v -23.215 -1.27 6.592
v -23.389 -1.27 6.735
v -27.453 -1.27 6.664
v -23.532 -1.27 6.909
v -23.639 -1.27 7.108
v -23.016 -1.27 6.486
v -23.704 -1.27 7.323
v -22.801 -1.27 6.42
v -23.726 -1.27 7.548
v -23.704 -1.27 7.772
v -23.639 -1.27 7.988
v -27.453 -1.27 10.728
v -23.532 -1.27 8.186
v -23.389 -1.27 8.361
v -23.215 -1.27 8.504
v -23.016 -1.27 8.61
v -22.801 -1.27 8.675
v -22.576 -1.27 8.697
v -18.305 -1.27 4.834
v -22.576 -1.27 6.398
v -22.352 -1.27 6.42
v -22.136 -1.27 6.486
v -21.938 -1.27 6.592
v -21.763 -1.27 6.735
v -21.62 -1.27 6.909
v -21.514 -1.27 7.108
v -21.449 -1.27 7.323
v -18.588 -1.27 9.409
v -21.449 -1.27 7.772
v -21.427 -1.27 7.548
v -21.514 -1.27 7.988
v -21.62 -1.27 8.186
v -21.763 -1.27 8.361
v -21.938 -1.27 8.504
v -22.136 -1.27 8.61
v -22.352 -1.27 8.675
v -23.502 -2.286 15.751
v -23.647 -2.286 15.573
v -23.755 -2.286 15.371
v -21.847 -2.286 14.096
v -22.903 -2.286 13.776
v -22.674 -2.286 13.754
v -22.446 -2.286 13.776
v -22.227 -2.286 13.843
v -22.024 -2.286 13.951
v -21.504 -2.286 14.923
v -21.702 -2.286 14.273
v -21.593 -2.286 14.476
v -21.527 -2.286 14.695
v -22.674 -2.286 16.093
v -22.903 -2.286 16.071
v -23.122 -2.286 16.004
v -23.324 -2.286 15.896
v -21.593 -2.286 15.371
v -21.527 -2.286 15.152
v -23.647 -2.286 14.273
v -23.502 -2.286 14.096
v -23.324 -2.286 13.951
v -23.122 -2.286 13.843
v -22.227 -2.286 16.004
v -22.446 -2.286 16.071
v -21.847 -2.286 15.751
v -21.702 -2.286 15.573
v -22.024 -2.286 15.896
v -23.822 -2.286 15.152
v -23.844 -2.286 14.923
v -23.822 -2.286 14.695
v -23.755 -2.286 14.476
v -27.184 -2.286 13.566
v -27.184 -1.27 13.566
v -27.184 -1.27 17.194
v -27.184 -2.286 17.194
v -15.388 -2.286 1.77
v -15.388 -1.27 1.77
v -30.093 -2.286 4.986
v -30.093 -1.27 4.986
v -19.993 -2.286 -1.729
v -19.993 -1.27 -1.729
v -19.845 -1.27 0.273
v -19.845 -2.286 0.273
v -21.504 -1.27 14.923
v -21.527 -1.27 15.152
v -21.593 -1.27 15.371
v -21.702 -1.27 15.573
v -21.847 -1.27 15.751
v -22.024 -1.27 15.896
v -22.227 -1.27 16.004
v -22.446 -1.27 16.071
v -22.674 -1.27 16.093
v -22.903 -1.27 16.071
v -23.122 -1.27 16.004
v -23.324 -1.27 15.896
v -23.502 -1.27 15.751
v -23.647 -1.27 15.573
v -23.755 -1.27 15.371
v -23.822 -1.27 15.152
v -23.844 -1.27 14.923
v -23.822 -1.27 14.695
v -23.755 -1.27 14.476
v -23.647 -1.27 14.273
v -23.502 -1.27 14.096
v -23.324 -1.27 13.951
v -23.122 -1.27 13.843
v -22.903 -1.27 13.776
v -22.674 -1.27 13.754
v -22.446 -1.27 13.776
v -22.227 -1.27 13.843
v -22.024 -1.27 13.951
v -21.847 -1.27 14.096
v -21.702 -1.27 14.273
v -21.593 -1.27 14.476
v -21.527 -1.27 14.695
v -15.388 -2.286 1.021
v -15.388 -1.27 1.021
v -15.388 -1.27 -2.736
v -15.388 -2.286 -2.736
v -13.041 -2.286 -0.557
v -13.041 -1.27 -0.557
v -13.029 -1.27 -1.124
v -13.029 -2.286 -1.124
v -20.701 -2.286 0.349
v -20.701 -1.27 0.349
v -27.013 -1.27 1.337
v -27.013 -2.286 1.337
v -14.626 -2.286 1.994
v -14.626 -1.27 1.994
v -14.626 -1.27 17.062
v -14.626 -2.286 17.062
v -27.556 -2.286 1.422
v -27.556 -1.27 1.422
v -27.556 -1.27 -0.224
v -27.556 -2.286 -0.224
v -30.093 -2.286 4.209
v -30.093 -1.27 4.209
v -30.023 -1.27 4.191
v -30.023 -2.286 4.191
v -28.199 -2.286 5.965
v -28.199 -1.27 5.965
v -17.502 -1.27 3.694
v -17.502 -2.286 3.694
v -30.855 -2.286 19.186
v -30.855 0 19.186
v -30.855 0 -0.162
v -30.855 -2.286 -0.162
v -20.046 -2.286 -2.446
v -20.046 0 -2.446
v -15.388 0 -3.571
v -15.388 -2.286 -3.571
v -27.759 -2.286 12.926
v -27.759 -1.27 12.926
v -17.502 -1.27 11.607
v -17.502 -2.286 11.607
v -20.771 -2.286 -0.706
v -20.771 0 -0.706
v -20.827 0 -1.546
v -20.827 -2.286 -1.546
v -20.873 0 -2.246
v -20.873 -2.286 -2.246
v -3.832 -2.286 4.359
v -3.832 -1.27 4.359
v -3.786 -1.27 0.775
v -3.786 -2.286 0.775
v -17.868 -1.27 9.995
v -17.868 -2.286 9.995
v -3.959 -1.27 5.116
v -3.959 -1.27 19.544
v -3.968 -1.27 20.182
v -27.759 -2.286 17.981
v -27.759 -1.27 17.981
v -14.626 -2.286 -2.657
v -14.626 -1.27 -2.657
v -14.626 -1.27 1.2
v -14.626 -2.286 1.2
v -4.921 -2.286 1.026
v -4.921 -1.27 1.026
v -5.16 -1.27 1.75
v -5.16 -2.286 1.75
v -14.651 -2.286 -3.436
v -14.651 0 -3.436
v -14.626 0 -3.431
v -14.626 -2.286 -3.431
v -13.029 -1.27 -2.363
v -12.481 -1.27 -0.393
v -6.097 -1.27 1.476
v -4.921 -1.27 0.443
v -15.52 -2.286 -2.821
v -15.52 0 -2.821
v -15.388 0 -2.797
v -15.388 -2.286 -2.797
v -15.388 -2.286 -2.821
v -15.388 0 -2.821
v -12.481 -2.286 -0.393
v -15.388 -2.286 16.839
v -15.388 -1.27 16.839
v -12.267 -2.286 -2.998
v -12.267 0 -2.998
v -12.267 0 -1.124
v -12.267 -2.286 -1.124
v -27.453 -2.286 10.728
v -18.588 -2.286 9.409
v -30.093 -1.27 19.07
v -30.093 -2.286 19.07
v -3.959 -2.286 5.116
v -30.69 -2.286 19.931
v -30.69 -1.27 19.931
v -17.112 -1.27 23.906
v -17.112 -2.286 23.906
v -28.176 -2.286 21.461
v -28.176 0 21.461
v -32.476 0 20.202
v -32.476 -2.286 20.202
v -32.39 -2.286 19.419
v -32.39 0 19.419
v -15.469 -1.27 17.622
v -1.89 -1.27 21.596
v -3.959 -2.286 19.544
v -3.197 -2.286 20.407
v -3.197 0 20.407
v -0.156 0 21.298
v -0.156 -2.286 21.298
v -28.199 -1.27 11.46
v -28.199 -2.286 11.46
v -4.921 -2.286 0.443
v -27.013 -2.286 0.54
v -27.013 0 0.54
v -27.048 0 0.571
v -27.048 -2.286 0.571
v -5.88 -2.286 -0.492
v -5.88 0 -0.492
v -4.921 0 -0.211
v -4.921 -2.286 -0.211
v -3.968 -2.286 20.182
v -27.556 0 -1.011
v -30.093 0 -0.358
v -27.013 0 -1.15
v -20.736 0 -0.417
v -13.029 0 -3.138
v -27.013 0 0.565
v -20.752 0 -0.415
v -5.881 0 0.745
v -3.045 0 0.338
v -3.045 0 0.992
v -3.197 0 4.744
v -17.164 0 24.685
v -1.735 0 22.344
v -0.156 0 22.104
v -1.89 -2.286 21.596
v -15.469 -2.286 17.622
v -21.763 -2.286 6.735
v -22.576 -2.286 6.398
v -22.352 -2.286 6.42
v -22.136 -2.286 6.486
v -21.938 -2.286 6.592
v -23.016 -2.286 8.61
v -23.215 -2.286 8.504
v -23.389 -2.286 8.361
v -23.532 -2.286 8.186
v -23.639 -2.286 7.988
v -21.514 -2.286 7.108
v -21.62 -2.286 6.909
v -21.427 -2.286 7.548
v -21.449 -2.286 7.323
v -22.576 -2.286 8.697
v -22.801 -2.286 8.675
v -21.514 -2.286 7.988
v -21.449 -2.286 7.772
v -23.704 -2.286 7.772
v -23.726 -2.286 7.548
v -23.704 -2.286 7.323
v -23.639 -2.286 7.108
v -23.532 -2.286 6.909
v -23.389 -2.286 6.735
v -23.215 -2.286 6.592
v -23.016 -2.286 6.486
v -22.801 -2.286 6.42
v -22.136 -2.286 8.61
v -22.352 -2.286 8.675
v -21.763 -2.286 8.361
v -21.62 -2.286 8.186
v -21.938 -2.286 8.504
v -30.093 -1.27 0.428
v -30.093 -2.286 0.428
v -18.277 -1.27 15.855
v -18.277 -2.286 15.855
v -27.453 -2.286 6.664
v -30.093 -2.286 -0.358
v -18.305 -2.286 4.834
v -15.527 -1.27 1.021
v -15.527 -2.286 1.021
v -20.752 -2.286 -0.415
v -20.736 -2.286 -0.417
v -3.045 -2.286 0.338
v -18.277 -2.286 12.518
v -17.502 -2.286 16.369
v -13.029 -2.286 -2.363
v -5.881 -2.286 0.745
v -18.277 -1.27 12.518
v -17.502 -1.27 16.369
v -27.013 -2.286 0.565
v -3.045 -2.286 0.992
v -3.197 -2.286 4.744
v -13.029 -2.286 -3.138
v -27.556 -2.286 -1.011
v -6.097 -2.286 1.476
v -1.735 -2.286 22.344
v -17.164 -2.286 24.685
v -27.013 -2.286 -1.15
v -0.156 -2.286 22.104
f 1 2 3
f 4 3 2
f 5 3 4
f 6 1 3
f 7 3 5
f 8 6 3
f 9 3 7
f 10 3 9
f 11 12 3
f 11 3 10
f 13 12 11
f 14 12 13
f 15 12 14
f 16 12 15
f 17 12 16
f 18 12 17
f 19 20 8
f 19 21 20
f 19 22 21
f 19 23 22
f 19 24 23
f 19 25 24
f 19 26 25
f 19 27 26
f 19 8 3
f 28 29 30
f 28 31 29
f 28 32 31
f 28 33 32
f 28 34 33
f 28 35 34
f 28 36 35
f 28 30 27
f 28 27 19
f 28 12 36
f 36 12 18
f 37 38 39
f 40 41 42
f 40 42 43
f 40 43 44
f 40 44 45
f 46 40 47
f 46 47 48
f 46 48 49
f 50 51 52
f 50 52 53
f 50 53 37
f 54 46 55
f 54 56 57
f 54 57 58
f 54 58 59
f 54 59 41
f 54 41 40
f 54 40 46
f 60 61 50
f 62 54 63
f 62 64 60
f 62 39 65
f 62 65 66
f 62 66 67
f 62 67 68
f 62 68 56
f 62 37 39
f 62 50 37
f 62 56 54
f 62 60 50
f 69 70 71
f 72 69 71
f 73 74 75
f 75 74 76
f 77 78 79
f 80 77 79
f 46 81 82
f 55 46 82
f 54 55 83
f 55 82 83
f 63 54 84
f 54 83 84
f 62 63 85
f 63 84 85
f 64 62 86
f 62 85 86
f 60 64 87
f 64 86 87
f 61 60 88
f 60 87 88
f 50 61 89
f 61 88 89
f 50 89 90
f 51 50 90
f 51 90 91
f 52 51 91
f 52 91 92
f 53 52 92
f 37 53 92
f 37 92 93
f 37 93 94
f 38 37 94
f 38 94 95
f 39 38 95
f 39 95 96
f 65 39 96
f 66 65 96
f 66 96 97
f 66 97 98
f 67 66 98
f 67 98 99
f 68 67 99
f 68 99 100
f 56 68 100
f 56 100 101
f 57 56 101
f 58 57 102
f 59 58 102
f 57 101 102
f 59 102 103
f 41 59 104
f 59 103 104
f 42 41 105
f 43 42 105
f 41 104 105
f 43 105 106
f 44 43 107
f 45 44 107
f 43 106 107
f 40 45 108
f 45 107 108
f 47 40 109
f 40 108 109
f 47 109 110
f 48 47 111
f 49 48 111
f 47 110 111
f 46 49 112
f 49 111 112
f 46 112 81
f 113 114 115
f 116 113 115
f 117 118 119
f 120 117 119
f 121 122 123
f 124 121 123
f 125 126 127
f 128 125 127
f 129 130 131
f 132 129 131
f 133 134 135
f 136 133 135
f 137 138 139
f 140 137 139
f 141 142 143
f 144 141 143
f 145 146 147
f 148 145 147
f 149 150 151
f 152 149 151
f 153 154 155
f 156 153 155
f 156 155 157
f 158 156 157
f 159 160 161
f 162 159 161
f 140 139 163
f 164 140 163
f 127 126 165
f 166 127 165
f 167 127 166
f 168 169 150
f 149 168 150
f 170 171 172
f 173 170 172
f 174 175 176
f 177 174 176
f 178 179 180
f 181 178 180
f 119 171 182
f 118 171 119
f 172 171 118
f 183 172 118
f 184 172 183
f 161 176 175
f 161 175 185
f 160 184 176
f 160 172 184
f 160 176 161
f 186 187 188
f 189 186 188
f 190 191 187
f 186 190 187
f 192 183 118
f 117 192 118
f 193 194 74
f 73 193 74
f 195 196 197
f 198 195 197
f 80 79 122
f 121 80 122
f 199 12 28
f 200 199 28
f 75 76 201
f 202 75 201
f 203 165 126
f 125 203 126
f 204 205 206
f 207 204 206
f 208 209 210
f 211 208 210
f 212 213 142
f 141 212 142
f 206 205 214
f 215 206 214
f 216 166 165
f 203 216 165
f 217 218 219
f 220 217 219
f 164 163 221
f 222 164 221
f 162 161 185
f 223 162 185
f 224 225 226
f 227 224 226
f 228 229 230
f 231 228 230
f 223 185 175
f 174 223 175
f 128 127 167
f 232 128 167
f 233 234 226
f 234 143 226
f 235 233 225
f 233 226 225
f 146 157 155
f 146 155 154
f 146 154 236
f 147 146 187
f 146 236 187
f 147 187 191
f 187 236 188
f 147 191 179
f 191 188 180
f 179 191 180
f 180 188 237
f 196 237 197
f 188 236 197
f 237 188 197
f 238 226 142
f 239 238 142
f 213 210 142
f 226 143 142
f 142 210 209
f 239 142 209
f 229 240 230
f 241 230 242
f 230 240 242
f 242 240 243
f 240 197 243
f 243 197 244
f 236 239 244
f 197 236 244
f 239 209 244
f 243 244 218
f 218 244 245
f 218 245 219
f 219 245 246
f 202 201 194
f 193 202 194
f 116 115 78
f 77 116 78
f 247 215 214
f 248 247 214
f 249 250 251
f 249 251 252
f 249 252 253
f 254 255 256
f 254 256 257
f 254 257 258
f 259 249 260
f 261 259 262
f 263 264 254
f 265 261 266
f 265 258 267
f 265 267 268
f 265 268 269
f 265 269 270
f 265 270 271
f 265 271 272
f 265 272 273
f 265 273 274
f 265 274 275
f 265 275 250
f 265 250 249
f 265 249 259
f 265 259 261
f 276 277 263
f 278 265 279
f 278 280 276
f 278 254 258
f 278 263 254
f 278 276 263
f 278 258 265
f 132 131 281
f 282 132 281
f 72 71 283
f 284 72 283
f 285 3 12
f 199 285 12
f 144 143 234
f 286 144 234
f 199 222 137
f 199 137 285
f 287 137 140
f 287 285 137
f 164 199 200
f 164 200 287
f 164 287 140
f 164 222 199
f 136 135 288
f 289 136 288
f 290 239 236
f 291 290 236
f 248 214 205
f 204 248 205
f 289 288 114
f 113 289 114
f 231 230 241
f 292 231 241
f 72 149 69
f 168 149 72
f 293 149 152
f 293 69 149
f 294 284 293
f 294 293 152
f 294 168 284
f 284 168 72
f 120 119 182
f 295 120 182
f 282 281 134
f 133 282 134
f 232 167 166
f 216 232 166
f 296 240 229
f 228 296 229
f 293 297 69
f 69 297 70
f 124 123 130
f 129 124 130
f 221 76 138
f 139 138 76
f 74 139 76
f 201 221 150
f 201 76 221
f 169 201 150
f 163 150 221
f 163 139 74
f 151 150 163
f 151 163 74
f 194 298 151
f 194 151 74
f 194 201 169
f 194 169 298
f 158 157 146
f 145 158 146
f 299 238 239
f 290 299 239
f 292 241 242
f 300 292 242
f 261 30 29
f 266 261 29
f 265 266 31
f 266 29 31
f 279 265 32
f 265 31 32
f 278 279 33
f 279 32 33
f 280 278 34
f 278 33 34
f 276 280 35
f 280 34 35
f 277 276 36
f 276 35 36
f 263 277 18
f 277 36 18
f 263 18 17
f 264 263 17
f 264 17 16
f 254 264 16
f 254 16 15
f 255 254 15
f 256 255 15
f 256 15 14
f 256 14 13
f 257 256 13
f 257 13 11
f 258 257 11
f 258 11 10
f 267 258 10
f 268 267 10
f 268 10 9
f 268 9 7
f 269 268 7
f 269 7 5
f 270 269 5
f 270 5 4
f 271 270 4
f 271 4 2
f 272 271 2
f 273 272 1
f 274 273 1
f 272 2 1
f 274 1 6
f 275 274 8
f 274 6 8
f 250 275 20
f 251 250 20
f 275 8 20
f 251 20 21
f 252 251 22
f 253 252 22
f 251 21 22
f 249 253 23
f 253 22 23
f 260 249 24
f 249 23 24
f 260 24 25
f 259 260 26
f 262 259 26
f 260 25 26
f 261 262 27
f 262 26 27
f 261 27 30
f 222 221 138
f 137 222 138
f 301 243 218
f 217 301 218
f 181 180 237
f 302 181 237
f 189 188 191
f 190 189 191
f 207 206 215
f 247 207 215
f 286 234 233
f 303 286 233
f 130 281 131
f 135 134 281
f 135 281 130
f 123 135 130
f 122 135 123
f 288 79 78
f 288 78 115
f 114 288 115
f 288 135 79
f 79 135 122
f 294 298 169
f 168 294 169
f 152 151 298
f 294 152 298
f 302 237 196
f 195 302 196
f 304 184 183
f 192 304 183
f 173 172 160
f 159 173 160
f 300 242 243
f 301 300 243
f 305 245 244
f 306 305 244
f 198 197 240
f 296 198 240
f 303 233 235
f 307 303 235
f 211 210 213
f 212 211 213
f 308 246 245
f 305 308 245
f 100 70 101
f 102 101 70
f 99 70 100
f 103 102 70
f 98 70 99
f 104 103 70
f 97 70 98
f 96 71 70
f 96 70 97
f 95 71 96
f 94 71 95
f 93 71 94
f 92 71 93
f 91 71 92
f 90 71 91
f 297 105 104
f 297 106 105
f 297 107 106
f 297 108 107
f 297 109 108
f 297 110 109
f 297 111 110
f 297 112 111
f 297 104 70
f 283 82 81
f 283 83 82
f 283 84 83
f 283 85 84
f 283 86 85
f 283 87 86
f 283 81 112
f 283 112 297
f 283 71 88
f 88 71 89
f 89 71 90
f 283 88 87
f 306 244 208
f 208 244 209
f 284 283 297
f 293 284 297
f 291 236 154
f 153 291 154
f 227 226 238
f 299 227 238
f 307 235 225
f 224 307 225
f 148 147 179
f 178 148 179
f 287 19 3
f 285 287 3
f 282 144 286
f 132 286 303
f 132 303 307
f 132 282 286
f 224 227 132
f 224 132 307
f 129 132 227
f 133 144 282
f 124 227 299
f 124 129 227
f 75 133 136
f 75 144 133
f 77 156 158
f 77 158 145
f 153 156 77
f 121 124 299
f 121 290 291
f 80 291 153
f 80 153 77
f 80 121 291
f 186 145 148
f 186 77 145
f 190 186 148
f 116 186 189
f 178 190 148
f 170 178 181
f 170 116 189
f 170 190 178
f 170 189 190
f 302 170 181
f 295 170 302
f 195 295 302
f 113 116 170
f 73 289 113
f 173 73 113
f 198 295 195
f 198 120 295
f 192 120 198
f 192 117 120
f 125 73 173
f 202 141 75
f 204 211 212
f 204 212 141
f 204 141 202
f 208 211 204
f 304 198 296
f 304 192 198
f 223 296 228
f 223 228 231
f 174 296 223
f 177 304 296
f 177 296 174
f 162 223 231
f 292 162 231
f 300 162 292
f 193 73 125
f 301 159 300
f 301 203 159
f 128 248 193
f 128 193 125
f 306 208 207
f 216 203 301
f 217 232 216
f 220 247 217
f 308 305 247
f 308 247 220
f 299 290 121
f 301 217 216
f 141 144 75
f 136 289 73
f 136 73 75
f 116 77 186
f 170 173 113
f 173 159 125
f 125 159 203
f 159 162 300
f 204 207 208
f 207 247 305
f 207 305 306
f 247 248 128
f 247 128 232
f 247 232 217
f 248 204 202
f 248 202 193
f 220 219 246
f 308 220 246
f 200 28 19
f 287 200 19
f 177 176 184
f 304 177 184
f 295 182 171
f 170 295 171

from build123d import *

# Parameters (mm, degrees)
F1_DEPTH = 1.27
F0_R     = 1.1698918357
F0_R_2   = 1.149683984
F2_DEPTH = 2.286


with BuildPart() as f1:
    # F0 (on Front) → F1 (new body)
    with BuildSketch(Plane.XZ):
        Polygon((-15.388094912, 1.7704545665), (-15.388094912, 16.057066756), (-15.388094912, 16.8387157017), (-30.0930766836, 19.0700641461), (-30.0930766836, 18.4871374451), (-30.0930766836, 4.9859051822), align=None)
        Polygon((-28.1987807881, 11.4603284719), (-17.8684613835, 9.9950339617), (-17.5021312367, 3.694271666), (-28.1987807881, 5.9654787155), align=None, mode=Mode.SUBTRACT)
        Polygon((-27.7591816317, 12.9256220507), (-27.7591816317, 17.9808847578), (-17.5021312367, 16.3690615418), (-17.5021312367, 11.6068571778), align=None, mode=Mode.SUBTRACT)
    extrude(amount=F1_DEPTH)



with BuildPart() as f1b:
    # F0 (on Front) → F1, piece 2 (new body)
    with BuildSketch(Plane.XZ):
        Polygon((-18.2767084967, 15.855339353), (-27.1837434899, 17.1943055438), (-27.1837434899, 13.5655133026), (-18.2767084967, 12.5176263945), align=None)
        with Locations((-22.6742944847, 14.9233993115)):
            Circle(F0_R, mode=Mode.SUBTRACT)
    extrude(amount=F1_DEPTH)


with BuildPart() as f1c:
    # F0 (on Front) → F1, piece 3 (new body)
    with BuildSketch(Plane.XZ):
        Polygon((-30.6900013238, 19.9313648045), (-15.4686479767, 17.6216616277), (-1.8903917537, 21.5964431966), (-17.1117451009, 23.9061463734), align=None)
    extrude(amount=F1_DEPTH)


with BuildPart() as f1d:
    # F0 (on Front) → F1, piece 4 (new body)
    with BuildSketch(Plane.XZ):
        Polygon((-14.626094912, 16.057066756), (-14.626094912, 1.9935158717), (-3.9594611633, 5.1159742), (-3.9594611633, 19.5436675764), (-3.9680227461, 20.1817290912), (-14.626094912, 17.0617770069), align=None)
    extrude(amount=F1_DEPTH)


with BuildPart() as f1e:
    # F0 (on Front) → F1, piece 5 (new body)
    with BuildSketch(Plane.XZ):
        Polygon((-3.8323173759, 4.3592156278), (-14.626094912, 1.1995383243), (-14.626094912, -2.6566980141), (-13.0292281976, -2.3633678097), (-13.0292281976, -1.1240722508), (-13.0411074846, -0.5566334484), (-12.4813056802, -0.3927618984), (-6.0969826496, 1.4761297395), (-5.1597074379, 1.7504995978), (-4.9214556754, 1.0262658156), (-4.9214556754, 0.4425999067), (-3.7855914693, 0.7751029937), align=None)
    extrude(amount=F1_DEPTH)


with BuildPart() as f1f:
    # F0 (on Front) → F1, piece 6 (new body)
    with BuildSketch(Plane.XZ):
        Polygon((-15.388094912, -2.7357117464), (-15.388094912, 1.0209244658), (-15.527460836, 1.0209244658), (-30.0231560015, 4.1906116282), (-30.0930766836, 4.2085912157), (-30.0930766836, 0.4284923682), (-27.5556394443, -0.2239908959), (-27.5556394443, 1.4215863233), (-27.0130208861, 1.3366546978), (-20.7008908468, 0.3486688349), (-19.8447576891, 0.273127106), (-19.9932244299, -1.7287355547), align=None)
    extrude(amount=F1_DEPTH)


with BuildPart() as f1g:
    # F0 (on Front) → F1, piece 7 (new body)
    with BuildSketch(Plane.XZ):
        Polygon((-18.5878000389, 9.4085130813), (-27.4529627692, 10.7276812168), (-27.4529627692, 6.66401535), (-18.3046332728, 4.8343520584), align=None)
        with Locations((-22.5763938557, 7.5477305772)):
            Circle(F0_R_2, mode=Mode.SUBTRACT)
    extrude(amount=F1_DEPTH)


with BuildPart() as f1_1:
    add(f1.part)

    add(f1b.part)  # F2 merges F1b

    add(f1c.part)  # F2 merges F1c

    add(f1d.part)  # F2 merges F1d

    add(f1e.part)  # F2 merges F1e

    add(f1f.part)  # F2 merges F1f

    add(f1g.part)  # F2 merges F1g
    # F0 (on Front) → F2 (join)
    with BuildSketch(Plane.XZ):
        Polygon((-17.5021312367, 3.694271666), (-17.8684613835, 9.9950339617), (-28.1987807881, 11.4603284719), (-28.1987807881, 5.9654787155), align=None)
        Polygon((-27.4529627692, 6.66401535), (-27.4529627692, 10.7276812168), (-18.5878000389, 9.4085130813), (-18.3046332728, 4.8343520584), align=None, mode=Mode.SUBTRACT)
        Polygon((-17.5021312367, 16.3690615418), (-27.7591816317, 17.9808847578), (-27.7591816317, 12.9256220507), (-17.5021312367, 11.6068571778), align=None)
        Polygon((-27.1837434899, 13.5655133026), (-27.1837434899, 17.1943055438), (-18.2767084967, 15.855339353), (-18.2767084967, 12.5176263945), align=None, mode=Mode.SUBTRACT)
        Polygon((-32.4763386121, 20.2024253873), (-30.6900013238, 19.9313648045), (-17.1117451009, 23.9061463734), (-1.8903917537, 21.5964431966), (-0.1563745312, 22.1040444366), (-1.7350990934, 22.3436016595), (-17.1640651666, 24.6848081963), (-28.1764094956, 21.4611495356), align=None)
        Polygon((-3.9594611633, 5.1159742), (-14.626094912, 1.9935158717), (-14.626094912, 1.7704545955), (-14.626094912, 1.1995383243), (-3.8323173759, 4.3592156278), (-3.7855914693, 0.7751029937), (-3.0450882633, 0.9918715129), (-3.1974611633, 4.7442035481), (-3.1974611633, 19.5436675764), (-3.1974611633, 20.4072966403), (-3.9680227461, 20.1817290912), (-3.9594611633, 19.5436675764), align=None)
        Polygon((-30.0930766836, 4.2085912157), (-30.0930766836, 4.9859051822), (-30.0930766836, 18.4871374451), (-30.0930766836, 19.0700641461), (-30.8550766836, 19.185690778), (-30.8550766836, 18.4871374451), (-30.8550766836, 4.9331725397), (-30.8550766836, 0.6244350459), (-30.8505439091, 0.6232694764), (-30.8485884176, 0.6227666362), (-30.0930766836, 0.4284923682), align=None)
        Polygon((-30.0930766836, 19.0700641461), (-15.388094912, 16.8387157017), (-15.4686479767, 17.6216616277), (-30.6900013238, 19.9313648045), (-32.4763386121, 20.2024253873), (-32.3898017041, 19.4185714671), (-30.8550766836, 19.185690778), align=None)
        Polygon((-15.4686479767, 17.6216616277), (-15.388094912, 16.8387157017), (-14.626094912, 17.0617770069), (-3.9680227461, 20.1817290912), (-3.1974611633, 20.4072966403), (-0.1563745312, 21.2975181015), (-0.1563745312, 22.1040444366), (-1.8903917537, 21.5964431966), align=None)
        Polygon((-15.388094912, 16.8387157017), (-15.388094912, 16.057066756), (-15.388094912, 1.7704545665), (-14.626094912, 1.9935158717), (-14.626094912, 16.057066756), (-14.626094912, 17.0617770069), align=None)
        Polygon((-15.388094912, 1.0209244658), (-15.388094912, 1.7704545665), (-30.0930766836, 4.9859051822), (-30.0930766836, 4.2085912157), (-30.0231560015, 4.1906116282), (-15.527460836, 1.0209244658), align=None)
        Polygon((-13.0292281976, -1.1240722508), (-13.0292281976, -2.3633678097), (-12.4034496222, -2.2484178544), (-12.2672281976, -2.223395191), (-12.2672281976, -1.1240722507), (-5.880947848, 0.7453923558), (-4.9214556754, 1.0262658156), (-5.1597074379, 1.7504995978), (-6.0969826496, 1.4761297395), (-12.4813056802, -0.3927618984), (-13.0411074846, -0.5566334484), align=None)
        Polygon((-20.7515549942, -0.414678788), (-20.7008908468, 0.3486688349), (-27.0130208861, 1.3366546978), (-27.0130208861, 0.5653770321), align=None)
        with Locations((-22.6742944847, 14.9233993115)):
            Circle(F0_R)
        with Locations((-22.5763938557, 7.5477305772)):
            Circle(F0_R_2)
        Polygon((-15.388094912, -2.7966706329), (-15.388094912, -2.7357117464), (-19.9932244299, -1.7287355547), (-20.0464328287, -2.4461750717), (-15.388094912, -3.57141984), (-15.388094912, -2.8208797925), (-15.5198876856, -2.8208797925), align=None)
        Polygon((-15.1740174294, 1.0391442142), (-15.388094912, 1.0209244658), (-15.388094912, -2.7357117464), (-15.388094912, -2.7966706329), (-14.626094912, -2.6566980141), (-14.626094912, 1.1995383243), align=None)
        Polygon((-27.5556394443, -0.2239908959), (-30.0930766836, 0.4284923682), (-30.0930766836, -0.1490246532), (-30.0930766836, -0.3582970146), (-27.5556394443, -1.0107802787), align=None)
        Polygon((-20.8266744405, -1.5464900143), (-19.9932244299, -1.7287355547), (-19.8447576891, 0.273127106), (-20.7008908468, 0.3486688349), (-20.7515549942, -0.414678788), (-20.7364695061, -0.4170399955), (-20.7708697434, -0.7056906514), align=None)
        Polygon((-13.0292281976, -2.3633678097), (-14.626094912, -2.6566980141), (-14.626094912, -3.4314472213), (-13.0292281976, -3.1381170169), (-13.0292281976, -2.9902135849), align=None)
        Polygon((-3.0450882633, 0.9918715129), (-3.7855914693, 0.7751029937), (-4.9214556754, 0.4425999067), (-4.9214556754, -0.2108097675), (-3.0450882633, 0.3384618388), align=None)
        Polygon((-4.9214556754, -0.2108097675), (-4.9214556754, 0.4425999067), (-4.9214556754, 1.0262658156), (-5.880947848, 0.7453923558), (-5.8803612014, -0.4915114974), align=None)
        Polygon((-27.5556394443, 1.4215863233), (-27.5556394443, -0.2239908959), (-27.0130208861, -0.3635212545), (-27.0130208861, 0.5396492752), (-27.0484225739, 0.5709181675), (-27.0130208861, 0.5653770321), (-27.0130208861, 1.3366546978), align=None)
        Polygon((-14.626094912, 1.9935158717), (-15.388094912, 1.7704545665), (-15.388094912, 1.0209244658), (-15.1740174294, 1.0391442142), (-14.626094912, 1.1995383243), (-14.626094912, 1.7704545955), align=None)
        Polygon((-30.0930766836, -0.1490246532), (-30.0930766836, 0.4284923682), (-30.8485884176, 0.6227666362), (-30.8505439091, 0.6232694764), (-30.8550766836, 0.6244350459), (-30.8550766836, -0.1623543369), (-30.0930766836, -0.3582970146), align=None)
        Polygon((-20.0464328287, -2.4461750717), (-19.9932244299, -1.7287355547), (-20.8266744405, -1.5464900143), (-20.8731335697, -2.2464813826), align=None)
        Polygon((-14.626094912, -2.6566980141), (-15.388094912, -2.7966706329), (-15.388094912, -2.8208797925), (-15.388094912, -3.57141984), (-14.6509673791, -3.4360160722), (-14.626094912, -3.4314472213), align=None)
        Polygon((-12.4034496222, -2.2484178544), (-13.0292281976, -2.3633678097), (-13.0292281976, -2.9902135849), (-13.0292281976, -3.1381170169), (-12.2672281976, -2.9981443981), (-12.2672281976, -2.223395191), align=None)
        Polygon((-27.0130208861, -0.3635212545), (-27.5556394443, -0.2239908959), (-27.5556394443, -1.0107802787), (-27.0130208861, -1.1503106373), (-27.0130208861, -0.3672745107), align=None)
    extrude(amount=F2_DEPTH)


solid = f1_1.part
